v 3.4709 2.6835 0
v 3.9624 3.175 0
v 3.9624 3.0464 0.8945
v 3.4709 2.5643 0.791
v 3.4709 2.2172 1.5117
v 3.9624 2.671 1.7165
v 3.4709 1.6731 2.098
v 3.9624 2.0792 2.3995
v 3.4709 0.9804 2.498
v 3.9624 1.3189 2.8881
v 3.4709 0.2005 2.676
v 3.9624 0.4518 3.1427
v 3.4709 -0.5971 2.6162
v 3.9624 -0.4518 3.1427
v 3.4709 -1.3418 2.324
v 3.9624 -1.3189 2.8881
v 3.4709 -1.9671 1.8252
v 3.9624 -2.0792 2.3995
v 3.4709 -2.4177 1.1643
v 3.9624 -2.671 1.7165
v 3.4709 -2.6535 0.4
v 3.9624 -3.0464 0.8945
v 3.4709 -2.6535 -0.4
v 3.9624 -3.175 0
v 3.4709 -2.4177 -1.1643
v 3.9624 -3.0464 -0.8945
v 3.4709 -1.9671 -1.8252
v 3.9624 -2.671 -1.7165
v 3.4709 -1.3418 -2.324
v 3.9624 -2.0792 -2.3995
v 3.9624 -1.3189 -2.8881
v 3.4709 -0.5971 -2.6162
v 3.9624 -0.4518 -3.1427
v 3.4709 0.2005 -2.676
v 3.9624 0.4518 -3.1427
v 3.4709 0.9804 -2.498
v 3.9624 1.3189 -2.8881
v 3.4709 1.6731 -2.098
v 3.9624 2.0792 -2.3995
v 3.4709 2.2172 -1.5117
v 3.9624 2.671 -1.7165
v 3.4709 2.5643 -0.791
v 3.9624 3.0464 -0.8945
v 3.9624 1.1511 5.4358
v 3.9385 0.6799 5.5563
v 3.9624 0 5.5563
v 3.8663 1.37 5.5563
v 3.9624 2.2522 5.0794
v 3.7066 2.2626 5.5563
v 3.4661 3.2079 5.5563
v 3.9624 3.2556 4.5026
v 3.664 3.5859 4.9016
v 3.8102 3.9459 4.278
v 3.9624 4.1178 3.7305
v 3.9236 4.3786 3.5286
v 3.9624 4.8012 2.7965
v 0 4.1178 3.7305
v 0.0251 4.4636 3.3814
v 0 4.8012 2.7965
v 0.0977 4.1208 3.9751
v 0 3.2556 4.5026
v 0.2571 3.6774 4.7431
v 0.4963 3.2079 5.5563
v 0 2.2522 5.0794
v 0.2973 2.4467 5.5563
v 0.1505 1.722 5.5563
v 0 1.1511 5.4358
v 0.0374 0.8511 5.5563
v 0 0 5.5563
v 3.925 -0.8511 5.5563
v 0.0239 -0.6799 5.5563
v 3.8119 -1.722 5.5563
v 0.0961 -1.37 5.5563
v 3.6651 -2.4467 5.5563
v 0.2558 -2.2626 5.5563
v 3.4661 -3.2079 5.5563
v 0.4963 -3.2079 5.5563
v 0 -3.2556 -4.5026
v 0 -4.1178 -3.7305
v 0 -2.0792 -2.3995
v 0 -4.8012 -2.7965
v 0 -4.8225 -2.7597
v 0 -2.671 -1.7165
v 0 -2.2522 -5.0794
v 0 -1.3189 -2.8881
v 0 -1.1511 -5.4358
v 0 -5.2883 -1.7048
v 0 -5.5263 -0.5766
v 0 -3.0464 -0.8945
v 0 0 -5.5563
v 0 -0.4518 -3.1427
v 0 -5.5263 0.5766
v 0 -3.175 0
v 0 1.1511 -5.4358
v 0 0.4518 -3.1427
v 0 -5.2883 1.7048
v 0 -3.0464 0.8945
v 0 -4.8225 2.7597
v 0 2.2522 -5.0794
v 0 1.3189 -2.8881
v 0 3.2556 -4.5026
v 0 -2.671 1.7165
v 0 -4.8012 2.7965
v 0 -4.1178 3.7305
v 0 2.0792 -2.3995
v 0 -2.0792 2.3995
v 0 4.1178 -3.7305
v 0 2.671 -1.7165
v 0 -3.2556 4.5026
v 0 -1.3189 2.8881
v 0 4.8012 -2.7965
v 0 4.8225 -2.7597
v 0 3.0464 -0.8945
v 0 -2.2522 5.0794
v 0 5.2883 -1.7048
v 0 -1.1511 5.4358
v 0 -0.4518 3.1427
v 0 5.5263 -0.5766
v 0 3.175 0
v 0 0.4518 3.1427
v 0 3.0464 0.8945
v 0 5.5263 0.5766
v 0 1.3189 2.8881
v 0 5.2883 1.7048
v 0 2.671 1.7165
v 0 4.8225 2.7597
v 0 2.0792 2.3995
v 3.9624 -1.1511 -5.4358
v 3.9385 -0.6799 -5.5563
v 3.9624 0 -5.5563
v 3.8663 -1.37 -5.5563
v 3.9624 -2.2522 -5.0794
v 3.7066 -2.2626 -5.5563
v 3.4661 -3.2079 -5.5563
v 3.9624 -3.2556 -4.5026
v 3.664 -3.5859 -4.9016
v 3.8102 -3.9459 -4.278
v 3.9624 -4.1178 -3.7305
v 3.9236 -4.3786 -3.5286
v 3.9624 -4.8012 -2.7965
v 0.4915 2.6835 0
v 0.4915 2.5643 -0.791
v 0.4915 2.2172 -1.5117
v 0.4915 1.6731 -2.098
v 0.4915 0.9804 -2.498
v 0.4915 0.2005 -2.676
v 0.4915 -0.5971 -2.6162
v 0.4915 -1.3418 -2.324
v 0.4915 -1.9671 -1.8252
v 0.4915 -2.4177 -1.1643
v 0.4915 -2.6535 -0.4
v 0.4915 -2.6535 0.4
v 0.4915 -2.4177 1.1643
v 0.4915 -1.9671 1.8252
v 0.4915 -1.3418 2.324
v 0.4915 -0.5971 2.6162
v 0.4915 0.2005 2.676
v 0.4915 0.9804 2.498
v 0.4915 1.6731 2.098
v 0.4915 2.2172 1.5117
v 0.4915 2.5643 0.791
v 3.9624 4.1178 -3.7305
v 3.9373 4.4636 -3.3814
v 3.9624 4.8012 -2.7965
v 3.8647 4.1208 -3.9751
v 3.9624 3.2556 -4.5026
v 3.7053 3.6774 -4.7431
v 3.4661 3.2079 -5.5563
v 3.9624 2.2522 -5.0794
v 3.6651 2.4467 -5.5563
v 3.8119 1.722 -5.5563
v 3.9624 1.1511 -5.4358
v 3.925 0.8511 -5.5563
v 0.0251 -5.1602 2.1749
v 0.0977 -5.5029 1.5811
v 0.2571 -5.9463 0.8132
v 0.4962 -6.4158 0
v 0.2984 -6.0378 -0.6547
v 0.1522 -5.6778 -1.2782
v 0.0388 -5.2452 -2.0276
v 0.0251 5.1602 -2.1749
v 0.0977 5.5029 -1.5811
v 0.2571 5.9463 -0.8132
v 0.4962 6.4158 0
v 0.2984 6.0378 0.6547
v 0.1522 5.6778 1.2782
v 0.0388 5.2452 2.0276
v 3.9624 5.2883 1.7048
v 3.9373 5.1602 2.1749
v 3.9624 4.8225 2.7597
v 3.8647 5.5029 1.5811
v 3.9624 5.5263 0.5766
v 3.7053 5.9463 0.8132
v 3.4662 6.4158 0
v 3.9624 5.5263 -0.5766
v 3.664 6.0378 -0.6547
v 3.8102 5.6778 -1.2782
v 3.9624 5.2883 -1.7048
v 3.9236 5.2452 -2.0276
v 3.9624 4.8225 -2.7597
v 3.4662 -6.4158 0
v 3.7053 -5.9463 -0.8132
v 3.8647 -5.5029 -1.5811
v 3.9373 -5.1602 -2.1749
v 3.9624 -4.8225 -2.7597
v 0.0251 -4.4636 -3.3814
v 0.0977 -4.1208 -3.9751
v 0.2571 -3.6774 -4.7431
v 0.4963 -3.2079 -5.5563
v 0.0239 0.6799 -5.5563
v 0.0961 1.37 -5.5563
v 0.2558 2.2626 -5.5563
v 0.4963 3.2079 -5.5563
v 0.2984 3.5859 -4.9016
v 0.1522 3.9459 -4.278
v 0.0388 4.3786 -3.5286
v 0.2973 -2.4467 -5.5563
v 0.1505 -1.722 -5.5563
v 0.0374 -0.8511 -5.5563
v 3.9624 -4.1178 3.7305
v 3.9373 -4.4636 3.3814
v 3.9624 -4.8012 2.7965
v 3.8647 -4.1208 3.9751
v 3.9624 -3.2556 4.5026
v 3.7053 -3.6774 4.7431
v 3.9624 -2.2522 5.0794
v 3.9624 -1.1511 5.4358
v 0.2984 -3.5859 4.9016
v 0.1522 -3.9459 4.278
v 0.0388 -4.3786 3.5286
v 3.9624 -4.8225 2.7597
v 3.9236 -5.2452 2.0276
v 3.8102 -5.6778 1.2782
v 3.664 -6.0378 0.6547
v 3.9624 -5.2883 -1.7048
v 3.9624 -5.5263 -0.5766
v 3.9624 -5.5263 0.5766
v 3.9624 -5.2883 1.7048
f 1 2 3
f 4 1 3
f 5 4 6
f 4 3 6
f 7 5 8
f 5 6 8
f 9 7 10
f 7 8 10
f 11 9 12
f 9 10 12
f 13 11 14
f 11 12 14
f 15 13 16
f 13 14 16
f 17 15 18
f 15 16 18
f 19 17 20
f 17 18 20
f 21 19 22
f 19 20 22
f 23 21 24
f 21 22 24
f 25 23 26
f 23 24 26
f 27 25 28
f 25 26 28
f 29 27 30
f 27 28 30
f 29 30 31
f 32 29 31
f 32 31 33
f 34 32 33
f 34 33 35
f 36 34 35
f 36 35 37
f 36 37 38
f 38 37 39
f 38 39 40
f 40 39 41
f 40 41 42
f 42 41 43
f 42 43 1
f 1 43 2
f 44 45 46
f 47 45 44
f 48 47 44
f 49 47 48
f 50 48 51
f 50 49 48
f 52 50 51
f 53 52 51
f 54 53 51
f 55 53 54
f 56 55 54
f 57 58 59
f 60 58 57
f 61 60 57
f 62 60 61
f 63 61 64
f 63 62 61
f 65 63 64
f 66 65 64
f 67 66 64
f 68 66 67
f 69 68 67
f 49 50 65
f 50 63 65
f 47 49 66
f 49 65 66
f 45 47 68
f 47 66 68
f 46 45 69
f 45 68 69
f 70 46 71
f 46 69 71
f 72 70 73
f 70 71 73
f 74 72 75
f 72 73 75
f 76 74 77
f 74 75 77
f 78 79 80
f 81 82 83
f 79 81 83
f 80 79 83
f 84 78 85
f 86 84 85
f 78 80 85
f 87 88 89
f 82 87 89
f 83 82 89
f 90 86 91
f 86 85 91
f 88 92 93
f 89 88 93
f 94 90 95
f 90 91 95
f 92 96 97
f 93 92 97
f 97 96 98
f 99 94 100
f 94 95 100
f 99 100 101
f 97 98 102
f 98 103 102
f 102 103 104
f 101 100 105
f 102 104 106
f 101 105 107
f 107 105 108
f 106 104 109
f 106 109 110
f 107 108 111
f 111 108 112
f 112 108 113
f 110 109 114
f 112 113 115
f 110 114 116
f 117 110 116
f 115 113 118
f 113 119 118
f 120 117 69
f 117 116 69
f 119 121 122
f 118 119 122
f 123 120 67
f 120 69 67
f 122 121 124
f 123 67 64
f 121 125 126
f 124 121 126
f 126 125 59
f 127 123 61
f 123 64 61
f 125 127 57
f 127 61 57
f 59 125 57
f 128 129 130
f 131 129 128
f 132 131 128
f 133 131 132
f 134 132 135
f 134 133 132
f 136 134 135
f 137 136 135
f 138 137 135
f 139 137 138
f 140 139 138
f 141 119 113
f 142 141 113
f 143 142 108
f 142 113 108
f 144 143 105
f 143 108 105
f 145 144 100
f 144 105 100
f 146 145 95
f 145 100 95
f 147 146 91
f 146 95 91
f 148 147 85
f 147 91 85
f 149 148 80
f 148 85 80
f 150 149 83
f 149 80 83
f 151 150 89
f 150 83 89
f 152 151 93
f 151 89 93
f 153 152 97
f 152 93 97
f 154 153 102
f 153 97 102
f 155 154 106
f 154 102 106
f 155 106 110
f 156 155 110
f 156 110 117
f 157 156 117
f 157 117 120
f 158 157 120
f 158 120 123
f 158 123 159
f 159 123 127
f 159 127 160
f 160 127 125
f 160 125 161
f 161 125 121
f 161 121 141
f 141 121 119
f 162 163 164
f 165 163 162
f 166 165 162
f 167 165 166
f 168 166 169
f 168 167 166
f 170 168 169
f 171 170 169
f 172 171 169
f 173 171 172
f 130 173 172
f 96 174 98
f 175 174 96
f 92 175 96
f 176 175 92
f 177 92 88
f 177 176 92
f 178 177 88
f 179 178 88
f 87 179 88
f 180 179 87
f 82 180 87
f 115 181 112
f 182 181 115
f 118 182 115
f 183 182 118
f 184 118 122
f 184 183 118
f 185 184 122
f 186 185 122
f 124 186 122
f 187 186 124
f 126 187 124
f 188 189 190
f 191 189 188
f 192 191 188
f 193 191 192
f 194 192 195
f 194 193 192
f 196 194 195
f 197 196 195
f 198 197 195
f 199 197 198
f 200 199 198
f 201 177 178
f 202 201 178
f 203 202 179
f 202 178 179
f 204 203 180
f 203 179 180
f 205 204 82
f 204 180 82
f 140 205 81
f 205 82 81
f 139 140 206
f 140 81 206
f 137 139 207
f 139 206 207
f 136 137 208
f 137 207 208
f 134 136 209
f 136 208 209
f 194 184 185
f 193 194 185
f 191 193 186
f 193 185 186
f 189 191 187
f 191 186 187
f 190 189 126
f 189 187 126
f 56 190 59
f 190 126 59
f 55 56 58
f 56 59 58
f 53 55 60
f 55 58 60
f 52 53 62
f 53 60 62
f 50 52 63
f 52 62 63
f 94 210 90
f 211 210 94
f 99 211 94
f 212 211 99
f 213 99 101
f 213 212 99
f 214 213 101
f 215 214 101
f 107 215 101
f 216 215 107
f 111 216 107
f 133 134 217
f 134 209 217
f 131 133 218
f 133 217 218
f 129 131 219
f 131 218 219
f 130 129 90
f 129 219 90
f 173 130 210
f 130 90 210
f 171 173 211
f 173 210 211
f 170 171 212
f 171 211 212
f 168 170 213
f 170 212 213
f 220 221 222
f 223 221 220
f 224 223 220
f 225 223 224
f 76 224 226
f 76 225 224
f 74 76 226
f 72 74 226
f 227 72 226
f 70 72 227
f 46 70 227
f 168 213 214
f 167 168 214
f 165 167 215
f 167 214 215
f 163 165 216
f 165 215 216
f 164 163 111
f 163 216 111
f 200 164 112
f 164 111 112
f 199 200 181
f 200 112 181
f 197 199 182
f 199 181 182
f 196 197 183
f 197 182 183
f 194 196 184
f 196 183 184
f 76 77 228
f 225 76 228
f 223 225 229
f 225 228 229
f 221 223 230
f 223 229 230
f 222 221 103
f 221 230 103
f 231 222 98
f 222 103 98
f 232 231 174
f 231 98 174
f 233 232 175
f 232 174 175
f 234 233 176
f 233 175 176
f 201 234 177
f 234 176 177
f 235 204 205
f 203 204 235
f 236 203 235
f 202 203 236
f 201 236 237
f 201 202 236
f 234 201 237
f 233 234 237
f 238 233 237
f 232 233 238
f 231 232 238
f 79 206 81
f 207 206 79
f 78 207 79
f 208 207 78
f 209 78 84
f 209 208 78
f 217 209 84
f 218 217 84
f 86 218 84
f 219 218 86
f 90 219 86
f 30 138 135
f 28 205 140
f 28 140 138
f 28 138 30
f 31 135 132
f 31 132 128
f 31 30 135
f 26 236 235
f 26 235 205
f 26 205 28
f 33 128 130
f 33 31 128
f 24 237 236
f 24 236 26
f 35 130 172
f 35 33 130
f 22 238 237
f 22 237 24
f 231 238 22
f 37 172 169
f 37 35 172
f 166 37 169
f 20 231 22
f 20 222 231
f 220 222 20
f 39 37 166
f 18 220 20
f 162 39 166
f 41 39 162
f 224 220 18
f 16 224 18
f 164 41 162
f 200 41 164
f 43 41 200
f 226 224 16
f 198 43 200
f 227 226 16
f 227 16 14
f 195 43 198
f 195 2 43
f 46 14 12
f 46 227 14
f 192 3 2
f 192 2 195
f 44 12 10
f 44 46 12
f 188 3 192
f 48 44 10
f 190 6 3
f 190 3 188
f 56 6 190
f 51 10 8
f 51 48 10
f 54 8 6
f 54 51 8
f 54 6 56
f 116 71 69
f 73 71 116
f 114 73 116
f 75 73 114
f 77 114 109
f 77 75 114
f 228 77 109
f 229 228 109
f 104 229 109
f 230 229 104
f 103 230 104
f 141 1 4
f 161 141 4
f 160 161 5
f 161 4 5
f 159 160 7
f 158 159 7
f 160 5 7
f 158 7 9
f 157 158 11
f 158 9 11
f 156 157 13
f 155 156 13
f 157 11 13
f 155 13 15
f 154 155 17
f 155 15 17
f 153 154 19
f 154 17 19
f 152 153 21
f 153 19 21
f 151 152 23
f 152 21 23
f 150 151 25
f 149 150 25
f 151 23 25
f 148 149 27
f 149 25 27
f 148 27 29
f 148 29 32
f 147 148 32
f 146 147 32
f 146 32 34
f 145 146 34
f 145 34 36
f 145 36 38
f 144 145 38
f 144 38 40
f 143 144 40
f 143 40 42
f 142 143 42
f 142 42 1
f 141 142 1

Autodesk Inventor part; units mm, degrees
sketch "Sketch_1" plane through (0, 0, 0) normal (1, 0, 0) x (0, 1, 0)
  line L0 (-3.2079, 5.5563) -> (-6.4158, 0)
  line L1 (-6.4158, 0) -> (-3.2079, -5.5563)
  line L2 (-3.2079, -5.5563) -> (3.2079, -5.5563)
  line L3 (3.2079, -5.5563) -> (6.4158, 0)
  line L4 (6.4158, 0) -> (3.2079, 5.5563)
  line L5 (3.2079, 5.5563) -> (-3.2079, 5.5563)
extrude "Extrusion1" add sketch "Sketch_1" along normal blind 3.9624
sketch "Fine_Thread" plane through (0, 0, 0) normal (0, 0, 1) x (1, 0, 0)
  line L0 (3.9624, 0) -> (0, 0)
  line L1 (0, 0) -> (0, 3.175)
  line L2 (0, 3.175) -> (0.4915, 2.6835)
  line L3 (0.4915, 2.6835) -> (3.4709, 2.6835)
  line L4 (3.4709, 2.6835) -> (3.9624, 3.175)
  line L5 (3.9624, 3.175) -> (3.9624, 0)
  line L6 (3.9624, 0) -> (0, 0)
revolve "Revolution1" cut sketch "Fine_Thread" angle 360 about axis through (3.9624, 0, 0) along (1, 0, 0)
thread "Thread1" size "1/4-28 UNF" class "2B" standard "ANSI Unified Screw Threads" full length
sketch "Sketch_3" plane through (0, 0, 0) normal (0, 0, 1) x (1, 0, 0)
  line L0 (25.4, 0) -> (-25.4, 0)
  line L1 (-0.508, 5.5563) -> (0, 5.5563)
  line L2 (0, 5.5563) -> (1.9812, 8.9878)
  line L3 (1.9812, 8.9878) -> (3.9624, 5.5563)
  line L4 (3.9624, 5.5563) -> (4.4704, 5.5563)
  line L5 (4.4704, 5.5563) -> (4.4704, 56.3563)
  line L6 (4.4704, 56.3563) -> (-0.508, 56.3563)
  line L7 (-0.508, 56.3563) -> (-0.508, 5.5563)
revolve "Revolution2" cut sketch "Sketch_3" angle 360 about axis through (25.4, 0, 0) along (1, 0, 0)
ref_plane "conn_XY" through (0, 0, 0) normal (1, 0, 0) x (0, 0, -1)
ref_plane "conn_YZ" through (0, 0, 0) normal (0, 0, -1) x (0, 1, 0)
ref_plane "conn_ZX" through (0, 0, 0) normal (0, 1, 0) x (1, 0, 0)
properties part number "PN1972-015_NUT1/4-28-UNF" material "Stainless Steel"
